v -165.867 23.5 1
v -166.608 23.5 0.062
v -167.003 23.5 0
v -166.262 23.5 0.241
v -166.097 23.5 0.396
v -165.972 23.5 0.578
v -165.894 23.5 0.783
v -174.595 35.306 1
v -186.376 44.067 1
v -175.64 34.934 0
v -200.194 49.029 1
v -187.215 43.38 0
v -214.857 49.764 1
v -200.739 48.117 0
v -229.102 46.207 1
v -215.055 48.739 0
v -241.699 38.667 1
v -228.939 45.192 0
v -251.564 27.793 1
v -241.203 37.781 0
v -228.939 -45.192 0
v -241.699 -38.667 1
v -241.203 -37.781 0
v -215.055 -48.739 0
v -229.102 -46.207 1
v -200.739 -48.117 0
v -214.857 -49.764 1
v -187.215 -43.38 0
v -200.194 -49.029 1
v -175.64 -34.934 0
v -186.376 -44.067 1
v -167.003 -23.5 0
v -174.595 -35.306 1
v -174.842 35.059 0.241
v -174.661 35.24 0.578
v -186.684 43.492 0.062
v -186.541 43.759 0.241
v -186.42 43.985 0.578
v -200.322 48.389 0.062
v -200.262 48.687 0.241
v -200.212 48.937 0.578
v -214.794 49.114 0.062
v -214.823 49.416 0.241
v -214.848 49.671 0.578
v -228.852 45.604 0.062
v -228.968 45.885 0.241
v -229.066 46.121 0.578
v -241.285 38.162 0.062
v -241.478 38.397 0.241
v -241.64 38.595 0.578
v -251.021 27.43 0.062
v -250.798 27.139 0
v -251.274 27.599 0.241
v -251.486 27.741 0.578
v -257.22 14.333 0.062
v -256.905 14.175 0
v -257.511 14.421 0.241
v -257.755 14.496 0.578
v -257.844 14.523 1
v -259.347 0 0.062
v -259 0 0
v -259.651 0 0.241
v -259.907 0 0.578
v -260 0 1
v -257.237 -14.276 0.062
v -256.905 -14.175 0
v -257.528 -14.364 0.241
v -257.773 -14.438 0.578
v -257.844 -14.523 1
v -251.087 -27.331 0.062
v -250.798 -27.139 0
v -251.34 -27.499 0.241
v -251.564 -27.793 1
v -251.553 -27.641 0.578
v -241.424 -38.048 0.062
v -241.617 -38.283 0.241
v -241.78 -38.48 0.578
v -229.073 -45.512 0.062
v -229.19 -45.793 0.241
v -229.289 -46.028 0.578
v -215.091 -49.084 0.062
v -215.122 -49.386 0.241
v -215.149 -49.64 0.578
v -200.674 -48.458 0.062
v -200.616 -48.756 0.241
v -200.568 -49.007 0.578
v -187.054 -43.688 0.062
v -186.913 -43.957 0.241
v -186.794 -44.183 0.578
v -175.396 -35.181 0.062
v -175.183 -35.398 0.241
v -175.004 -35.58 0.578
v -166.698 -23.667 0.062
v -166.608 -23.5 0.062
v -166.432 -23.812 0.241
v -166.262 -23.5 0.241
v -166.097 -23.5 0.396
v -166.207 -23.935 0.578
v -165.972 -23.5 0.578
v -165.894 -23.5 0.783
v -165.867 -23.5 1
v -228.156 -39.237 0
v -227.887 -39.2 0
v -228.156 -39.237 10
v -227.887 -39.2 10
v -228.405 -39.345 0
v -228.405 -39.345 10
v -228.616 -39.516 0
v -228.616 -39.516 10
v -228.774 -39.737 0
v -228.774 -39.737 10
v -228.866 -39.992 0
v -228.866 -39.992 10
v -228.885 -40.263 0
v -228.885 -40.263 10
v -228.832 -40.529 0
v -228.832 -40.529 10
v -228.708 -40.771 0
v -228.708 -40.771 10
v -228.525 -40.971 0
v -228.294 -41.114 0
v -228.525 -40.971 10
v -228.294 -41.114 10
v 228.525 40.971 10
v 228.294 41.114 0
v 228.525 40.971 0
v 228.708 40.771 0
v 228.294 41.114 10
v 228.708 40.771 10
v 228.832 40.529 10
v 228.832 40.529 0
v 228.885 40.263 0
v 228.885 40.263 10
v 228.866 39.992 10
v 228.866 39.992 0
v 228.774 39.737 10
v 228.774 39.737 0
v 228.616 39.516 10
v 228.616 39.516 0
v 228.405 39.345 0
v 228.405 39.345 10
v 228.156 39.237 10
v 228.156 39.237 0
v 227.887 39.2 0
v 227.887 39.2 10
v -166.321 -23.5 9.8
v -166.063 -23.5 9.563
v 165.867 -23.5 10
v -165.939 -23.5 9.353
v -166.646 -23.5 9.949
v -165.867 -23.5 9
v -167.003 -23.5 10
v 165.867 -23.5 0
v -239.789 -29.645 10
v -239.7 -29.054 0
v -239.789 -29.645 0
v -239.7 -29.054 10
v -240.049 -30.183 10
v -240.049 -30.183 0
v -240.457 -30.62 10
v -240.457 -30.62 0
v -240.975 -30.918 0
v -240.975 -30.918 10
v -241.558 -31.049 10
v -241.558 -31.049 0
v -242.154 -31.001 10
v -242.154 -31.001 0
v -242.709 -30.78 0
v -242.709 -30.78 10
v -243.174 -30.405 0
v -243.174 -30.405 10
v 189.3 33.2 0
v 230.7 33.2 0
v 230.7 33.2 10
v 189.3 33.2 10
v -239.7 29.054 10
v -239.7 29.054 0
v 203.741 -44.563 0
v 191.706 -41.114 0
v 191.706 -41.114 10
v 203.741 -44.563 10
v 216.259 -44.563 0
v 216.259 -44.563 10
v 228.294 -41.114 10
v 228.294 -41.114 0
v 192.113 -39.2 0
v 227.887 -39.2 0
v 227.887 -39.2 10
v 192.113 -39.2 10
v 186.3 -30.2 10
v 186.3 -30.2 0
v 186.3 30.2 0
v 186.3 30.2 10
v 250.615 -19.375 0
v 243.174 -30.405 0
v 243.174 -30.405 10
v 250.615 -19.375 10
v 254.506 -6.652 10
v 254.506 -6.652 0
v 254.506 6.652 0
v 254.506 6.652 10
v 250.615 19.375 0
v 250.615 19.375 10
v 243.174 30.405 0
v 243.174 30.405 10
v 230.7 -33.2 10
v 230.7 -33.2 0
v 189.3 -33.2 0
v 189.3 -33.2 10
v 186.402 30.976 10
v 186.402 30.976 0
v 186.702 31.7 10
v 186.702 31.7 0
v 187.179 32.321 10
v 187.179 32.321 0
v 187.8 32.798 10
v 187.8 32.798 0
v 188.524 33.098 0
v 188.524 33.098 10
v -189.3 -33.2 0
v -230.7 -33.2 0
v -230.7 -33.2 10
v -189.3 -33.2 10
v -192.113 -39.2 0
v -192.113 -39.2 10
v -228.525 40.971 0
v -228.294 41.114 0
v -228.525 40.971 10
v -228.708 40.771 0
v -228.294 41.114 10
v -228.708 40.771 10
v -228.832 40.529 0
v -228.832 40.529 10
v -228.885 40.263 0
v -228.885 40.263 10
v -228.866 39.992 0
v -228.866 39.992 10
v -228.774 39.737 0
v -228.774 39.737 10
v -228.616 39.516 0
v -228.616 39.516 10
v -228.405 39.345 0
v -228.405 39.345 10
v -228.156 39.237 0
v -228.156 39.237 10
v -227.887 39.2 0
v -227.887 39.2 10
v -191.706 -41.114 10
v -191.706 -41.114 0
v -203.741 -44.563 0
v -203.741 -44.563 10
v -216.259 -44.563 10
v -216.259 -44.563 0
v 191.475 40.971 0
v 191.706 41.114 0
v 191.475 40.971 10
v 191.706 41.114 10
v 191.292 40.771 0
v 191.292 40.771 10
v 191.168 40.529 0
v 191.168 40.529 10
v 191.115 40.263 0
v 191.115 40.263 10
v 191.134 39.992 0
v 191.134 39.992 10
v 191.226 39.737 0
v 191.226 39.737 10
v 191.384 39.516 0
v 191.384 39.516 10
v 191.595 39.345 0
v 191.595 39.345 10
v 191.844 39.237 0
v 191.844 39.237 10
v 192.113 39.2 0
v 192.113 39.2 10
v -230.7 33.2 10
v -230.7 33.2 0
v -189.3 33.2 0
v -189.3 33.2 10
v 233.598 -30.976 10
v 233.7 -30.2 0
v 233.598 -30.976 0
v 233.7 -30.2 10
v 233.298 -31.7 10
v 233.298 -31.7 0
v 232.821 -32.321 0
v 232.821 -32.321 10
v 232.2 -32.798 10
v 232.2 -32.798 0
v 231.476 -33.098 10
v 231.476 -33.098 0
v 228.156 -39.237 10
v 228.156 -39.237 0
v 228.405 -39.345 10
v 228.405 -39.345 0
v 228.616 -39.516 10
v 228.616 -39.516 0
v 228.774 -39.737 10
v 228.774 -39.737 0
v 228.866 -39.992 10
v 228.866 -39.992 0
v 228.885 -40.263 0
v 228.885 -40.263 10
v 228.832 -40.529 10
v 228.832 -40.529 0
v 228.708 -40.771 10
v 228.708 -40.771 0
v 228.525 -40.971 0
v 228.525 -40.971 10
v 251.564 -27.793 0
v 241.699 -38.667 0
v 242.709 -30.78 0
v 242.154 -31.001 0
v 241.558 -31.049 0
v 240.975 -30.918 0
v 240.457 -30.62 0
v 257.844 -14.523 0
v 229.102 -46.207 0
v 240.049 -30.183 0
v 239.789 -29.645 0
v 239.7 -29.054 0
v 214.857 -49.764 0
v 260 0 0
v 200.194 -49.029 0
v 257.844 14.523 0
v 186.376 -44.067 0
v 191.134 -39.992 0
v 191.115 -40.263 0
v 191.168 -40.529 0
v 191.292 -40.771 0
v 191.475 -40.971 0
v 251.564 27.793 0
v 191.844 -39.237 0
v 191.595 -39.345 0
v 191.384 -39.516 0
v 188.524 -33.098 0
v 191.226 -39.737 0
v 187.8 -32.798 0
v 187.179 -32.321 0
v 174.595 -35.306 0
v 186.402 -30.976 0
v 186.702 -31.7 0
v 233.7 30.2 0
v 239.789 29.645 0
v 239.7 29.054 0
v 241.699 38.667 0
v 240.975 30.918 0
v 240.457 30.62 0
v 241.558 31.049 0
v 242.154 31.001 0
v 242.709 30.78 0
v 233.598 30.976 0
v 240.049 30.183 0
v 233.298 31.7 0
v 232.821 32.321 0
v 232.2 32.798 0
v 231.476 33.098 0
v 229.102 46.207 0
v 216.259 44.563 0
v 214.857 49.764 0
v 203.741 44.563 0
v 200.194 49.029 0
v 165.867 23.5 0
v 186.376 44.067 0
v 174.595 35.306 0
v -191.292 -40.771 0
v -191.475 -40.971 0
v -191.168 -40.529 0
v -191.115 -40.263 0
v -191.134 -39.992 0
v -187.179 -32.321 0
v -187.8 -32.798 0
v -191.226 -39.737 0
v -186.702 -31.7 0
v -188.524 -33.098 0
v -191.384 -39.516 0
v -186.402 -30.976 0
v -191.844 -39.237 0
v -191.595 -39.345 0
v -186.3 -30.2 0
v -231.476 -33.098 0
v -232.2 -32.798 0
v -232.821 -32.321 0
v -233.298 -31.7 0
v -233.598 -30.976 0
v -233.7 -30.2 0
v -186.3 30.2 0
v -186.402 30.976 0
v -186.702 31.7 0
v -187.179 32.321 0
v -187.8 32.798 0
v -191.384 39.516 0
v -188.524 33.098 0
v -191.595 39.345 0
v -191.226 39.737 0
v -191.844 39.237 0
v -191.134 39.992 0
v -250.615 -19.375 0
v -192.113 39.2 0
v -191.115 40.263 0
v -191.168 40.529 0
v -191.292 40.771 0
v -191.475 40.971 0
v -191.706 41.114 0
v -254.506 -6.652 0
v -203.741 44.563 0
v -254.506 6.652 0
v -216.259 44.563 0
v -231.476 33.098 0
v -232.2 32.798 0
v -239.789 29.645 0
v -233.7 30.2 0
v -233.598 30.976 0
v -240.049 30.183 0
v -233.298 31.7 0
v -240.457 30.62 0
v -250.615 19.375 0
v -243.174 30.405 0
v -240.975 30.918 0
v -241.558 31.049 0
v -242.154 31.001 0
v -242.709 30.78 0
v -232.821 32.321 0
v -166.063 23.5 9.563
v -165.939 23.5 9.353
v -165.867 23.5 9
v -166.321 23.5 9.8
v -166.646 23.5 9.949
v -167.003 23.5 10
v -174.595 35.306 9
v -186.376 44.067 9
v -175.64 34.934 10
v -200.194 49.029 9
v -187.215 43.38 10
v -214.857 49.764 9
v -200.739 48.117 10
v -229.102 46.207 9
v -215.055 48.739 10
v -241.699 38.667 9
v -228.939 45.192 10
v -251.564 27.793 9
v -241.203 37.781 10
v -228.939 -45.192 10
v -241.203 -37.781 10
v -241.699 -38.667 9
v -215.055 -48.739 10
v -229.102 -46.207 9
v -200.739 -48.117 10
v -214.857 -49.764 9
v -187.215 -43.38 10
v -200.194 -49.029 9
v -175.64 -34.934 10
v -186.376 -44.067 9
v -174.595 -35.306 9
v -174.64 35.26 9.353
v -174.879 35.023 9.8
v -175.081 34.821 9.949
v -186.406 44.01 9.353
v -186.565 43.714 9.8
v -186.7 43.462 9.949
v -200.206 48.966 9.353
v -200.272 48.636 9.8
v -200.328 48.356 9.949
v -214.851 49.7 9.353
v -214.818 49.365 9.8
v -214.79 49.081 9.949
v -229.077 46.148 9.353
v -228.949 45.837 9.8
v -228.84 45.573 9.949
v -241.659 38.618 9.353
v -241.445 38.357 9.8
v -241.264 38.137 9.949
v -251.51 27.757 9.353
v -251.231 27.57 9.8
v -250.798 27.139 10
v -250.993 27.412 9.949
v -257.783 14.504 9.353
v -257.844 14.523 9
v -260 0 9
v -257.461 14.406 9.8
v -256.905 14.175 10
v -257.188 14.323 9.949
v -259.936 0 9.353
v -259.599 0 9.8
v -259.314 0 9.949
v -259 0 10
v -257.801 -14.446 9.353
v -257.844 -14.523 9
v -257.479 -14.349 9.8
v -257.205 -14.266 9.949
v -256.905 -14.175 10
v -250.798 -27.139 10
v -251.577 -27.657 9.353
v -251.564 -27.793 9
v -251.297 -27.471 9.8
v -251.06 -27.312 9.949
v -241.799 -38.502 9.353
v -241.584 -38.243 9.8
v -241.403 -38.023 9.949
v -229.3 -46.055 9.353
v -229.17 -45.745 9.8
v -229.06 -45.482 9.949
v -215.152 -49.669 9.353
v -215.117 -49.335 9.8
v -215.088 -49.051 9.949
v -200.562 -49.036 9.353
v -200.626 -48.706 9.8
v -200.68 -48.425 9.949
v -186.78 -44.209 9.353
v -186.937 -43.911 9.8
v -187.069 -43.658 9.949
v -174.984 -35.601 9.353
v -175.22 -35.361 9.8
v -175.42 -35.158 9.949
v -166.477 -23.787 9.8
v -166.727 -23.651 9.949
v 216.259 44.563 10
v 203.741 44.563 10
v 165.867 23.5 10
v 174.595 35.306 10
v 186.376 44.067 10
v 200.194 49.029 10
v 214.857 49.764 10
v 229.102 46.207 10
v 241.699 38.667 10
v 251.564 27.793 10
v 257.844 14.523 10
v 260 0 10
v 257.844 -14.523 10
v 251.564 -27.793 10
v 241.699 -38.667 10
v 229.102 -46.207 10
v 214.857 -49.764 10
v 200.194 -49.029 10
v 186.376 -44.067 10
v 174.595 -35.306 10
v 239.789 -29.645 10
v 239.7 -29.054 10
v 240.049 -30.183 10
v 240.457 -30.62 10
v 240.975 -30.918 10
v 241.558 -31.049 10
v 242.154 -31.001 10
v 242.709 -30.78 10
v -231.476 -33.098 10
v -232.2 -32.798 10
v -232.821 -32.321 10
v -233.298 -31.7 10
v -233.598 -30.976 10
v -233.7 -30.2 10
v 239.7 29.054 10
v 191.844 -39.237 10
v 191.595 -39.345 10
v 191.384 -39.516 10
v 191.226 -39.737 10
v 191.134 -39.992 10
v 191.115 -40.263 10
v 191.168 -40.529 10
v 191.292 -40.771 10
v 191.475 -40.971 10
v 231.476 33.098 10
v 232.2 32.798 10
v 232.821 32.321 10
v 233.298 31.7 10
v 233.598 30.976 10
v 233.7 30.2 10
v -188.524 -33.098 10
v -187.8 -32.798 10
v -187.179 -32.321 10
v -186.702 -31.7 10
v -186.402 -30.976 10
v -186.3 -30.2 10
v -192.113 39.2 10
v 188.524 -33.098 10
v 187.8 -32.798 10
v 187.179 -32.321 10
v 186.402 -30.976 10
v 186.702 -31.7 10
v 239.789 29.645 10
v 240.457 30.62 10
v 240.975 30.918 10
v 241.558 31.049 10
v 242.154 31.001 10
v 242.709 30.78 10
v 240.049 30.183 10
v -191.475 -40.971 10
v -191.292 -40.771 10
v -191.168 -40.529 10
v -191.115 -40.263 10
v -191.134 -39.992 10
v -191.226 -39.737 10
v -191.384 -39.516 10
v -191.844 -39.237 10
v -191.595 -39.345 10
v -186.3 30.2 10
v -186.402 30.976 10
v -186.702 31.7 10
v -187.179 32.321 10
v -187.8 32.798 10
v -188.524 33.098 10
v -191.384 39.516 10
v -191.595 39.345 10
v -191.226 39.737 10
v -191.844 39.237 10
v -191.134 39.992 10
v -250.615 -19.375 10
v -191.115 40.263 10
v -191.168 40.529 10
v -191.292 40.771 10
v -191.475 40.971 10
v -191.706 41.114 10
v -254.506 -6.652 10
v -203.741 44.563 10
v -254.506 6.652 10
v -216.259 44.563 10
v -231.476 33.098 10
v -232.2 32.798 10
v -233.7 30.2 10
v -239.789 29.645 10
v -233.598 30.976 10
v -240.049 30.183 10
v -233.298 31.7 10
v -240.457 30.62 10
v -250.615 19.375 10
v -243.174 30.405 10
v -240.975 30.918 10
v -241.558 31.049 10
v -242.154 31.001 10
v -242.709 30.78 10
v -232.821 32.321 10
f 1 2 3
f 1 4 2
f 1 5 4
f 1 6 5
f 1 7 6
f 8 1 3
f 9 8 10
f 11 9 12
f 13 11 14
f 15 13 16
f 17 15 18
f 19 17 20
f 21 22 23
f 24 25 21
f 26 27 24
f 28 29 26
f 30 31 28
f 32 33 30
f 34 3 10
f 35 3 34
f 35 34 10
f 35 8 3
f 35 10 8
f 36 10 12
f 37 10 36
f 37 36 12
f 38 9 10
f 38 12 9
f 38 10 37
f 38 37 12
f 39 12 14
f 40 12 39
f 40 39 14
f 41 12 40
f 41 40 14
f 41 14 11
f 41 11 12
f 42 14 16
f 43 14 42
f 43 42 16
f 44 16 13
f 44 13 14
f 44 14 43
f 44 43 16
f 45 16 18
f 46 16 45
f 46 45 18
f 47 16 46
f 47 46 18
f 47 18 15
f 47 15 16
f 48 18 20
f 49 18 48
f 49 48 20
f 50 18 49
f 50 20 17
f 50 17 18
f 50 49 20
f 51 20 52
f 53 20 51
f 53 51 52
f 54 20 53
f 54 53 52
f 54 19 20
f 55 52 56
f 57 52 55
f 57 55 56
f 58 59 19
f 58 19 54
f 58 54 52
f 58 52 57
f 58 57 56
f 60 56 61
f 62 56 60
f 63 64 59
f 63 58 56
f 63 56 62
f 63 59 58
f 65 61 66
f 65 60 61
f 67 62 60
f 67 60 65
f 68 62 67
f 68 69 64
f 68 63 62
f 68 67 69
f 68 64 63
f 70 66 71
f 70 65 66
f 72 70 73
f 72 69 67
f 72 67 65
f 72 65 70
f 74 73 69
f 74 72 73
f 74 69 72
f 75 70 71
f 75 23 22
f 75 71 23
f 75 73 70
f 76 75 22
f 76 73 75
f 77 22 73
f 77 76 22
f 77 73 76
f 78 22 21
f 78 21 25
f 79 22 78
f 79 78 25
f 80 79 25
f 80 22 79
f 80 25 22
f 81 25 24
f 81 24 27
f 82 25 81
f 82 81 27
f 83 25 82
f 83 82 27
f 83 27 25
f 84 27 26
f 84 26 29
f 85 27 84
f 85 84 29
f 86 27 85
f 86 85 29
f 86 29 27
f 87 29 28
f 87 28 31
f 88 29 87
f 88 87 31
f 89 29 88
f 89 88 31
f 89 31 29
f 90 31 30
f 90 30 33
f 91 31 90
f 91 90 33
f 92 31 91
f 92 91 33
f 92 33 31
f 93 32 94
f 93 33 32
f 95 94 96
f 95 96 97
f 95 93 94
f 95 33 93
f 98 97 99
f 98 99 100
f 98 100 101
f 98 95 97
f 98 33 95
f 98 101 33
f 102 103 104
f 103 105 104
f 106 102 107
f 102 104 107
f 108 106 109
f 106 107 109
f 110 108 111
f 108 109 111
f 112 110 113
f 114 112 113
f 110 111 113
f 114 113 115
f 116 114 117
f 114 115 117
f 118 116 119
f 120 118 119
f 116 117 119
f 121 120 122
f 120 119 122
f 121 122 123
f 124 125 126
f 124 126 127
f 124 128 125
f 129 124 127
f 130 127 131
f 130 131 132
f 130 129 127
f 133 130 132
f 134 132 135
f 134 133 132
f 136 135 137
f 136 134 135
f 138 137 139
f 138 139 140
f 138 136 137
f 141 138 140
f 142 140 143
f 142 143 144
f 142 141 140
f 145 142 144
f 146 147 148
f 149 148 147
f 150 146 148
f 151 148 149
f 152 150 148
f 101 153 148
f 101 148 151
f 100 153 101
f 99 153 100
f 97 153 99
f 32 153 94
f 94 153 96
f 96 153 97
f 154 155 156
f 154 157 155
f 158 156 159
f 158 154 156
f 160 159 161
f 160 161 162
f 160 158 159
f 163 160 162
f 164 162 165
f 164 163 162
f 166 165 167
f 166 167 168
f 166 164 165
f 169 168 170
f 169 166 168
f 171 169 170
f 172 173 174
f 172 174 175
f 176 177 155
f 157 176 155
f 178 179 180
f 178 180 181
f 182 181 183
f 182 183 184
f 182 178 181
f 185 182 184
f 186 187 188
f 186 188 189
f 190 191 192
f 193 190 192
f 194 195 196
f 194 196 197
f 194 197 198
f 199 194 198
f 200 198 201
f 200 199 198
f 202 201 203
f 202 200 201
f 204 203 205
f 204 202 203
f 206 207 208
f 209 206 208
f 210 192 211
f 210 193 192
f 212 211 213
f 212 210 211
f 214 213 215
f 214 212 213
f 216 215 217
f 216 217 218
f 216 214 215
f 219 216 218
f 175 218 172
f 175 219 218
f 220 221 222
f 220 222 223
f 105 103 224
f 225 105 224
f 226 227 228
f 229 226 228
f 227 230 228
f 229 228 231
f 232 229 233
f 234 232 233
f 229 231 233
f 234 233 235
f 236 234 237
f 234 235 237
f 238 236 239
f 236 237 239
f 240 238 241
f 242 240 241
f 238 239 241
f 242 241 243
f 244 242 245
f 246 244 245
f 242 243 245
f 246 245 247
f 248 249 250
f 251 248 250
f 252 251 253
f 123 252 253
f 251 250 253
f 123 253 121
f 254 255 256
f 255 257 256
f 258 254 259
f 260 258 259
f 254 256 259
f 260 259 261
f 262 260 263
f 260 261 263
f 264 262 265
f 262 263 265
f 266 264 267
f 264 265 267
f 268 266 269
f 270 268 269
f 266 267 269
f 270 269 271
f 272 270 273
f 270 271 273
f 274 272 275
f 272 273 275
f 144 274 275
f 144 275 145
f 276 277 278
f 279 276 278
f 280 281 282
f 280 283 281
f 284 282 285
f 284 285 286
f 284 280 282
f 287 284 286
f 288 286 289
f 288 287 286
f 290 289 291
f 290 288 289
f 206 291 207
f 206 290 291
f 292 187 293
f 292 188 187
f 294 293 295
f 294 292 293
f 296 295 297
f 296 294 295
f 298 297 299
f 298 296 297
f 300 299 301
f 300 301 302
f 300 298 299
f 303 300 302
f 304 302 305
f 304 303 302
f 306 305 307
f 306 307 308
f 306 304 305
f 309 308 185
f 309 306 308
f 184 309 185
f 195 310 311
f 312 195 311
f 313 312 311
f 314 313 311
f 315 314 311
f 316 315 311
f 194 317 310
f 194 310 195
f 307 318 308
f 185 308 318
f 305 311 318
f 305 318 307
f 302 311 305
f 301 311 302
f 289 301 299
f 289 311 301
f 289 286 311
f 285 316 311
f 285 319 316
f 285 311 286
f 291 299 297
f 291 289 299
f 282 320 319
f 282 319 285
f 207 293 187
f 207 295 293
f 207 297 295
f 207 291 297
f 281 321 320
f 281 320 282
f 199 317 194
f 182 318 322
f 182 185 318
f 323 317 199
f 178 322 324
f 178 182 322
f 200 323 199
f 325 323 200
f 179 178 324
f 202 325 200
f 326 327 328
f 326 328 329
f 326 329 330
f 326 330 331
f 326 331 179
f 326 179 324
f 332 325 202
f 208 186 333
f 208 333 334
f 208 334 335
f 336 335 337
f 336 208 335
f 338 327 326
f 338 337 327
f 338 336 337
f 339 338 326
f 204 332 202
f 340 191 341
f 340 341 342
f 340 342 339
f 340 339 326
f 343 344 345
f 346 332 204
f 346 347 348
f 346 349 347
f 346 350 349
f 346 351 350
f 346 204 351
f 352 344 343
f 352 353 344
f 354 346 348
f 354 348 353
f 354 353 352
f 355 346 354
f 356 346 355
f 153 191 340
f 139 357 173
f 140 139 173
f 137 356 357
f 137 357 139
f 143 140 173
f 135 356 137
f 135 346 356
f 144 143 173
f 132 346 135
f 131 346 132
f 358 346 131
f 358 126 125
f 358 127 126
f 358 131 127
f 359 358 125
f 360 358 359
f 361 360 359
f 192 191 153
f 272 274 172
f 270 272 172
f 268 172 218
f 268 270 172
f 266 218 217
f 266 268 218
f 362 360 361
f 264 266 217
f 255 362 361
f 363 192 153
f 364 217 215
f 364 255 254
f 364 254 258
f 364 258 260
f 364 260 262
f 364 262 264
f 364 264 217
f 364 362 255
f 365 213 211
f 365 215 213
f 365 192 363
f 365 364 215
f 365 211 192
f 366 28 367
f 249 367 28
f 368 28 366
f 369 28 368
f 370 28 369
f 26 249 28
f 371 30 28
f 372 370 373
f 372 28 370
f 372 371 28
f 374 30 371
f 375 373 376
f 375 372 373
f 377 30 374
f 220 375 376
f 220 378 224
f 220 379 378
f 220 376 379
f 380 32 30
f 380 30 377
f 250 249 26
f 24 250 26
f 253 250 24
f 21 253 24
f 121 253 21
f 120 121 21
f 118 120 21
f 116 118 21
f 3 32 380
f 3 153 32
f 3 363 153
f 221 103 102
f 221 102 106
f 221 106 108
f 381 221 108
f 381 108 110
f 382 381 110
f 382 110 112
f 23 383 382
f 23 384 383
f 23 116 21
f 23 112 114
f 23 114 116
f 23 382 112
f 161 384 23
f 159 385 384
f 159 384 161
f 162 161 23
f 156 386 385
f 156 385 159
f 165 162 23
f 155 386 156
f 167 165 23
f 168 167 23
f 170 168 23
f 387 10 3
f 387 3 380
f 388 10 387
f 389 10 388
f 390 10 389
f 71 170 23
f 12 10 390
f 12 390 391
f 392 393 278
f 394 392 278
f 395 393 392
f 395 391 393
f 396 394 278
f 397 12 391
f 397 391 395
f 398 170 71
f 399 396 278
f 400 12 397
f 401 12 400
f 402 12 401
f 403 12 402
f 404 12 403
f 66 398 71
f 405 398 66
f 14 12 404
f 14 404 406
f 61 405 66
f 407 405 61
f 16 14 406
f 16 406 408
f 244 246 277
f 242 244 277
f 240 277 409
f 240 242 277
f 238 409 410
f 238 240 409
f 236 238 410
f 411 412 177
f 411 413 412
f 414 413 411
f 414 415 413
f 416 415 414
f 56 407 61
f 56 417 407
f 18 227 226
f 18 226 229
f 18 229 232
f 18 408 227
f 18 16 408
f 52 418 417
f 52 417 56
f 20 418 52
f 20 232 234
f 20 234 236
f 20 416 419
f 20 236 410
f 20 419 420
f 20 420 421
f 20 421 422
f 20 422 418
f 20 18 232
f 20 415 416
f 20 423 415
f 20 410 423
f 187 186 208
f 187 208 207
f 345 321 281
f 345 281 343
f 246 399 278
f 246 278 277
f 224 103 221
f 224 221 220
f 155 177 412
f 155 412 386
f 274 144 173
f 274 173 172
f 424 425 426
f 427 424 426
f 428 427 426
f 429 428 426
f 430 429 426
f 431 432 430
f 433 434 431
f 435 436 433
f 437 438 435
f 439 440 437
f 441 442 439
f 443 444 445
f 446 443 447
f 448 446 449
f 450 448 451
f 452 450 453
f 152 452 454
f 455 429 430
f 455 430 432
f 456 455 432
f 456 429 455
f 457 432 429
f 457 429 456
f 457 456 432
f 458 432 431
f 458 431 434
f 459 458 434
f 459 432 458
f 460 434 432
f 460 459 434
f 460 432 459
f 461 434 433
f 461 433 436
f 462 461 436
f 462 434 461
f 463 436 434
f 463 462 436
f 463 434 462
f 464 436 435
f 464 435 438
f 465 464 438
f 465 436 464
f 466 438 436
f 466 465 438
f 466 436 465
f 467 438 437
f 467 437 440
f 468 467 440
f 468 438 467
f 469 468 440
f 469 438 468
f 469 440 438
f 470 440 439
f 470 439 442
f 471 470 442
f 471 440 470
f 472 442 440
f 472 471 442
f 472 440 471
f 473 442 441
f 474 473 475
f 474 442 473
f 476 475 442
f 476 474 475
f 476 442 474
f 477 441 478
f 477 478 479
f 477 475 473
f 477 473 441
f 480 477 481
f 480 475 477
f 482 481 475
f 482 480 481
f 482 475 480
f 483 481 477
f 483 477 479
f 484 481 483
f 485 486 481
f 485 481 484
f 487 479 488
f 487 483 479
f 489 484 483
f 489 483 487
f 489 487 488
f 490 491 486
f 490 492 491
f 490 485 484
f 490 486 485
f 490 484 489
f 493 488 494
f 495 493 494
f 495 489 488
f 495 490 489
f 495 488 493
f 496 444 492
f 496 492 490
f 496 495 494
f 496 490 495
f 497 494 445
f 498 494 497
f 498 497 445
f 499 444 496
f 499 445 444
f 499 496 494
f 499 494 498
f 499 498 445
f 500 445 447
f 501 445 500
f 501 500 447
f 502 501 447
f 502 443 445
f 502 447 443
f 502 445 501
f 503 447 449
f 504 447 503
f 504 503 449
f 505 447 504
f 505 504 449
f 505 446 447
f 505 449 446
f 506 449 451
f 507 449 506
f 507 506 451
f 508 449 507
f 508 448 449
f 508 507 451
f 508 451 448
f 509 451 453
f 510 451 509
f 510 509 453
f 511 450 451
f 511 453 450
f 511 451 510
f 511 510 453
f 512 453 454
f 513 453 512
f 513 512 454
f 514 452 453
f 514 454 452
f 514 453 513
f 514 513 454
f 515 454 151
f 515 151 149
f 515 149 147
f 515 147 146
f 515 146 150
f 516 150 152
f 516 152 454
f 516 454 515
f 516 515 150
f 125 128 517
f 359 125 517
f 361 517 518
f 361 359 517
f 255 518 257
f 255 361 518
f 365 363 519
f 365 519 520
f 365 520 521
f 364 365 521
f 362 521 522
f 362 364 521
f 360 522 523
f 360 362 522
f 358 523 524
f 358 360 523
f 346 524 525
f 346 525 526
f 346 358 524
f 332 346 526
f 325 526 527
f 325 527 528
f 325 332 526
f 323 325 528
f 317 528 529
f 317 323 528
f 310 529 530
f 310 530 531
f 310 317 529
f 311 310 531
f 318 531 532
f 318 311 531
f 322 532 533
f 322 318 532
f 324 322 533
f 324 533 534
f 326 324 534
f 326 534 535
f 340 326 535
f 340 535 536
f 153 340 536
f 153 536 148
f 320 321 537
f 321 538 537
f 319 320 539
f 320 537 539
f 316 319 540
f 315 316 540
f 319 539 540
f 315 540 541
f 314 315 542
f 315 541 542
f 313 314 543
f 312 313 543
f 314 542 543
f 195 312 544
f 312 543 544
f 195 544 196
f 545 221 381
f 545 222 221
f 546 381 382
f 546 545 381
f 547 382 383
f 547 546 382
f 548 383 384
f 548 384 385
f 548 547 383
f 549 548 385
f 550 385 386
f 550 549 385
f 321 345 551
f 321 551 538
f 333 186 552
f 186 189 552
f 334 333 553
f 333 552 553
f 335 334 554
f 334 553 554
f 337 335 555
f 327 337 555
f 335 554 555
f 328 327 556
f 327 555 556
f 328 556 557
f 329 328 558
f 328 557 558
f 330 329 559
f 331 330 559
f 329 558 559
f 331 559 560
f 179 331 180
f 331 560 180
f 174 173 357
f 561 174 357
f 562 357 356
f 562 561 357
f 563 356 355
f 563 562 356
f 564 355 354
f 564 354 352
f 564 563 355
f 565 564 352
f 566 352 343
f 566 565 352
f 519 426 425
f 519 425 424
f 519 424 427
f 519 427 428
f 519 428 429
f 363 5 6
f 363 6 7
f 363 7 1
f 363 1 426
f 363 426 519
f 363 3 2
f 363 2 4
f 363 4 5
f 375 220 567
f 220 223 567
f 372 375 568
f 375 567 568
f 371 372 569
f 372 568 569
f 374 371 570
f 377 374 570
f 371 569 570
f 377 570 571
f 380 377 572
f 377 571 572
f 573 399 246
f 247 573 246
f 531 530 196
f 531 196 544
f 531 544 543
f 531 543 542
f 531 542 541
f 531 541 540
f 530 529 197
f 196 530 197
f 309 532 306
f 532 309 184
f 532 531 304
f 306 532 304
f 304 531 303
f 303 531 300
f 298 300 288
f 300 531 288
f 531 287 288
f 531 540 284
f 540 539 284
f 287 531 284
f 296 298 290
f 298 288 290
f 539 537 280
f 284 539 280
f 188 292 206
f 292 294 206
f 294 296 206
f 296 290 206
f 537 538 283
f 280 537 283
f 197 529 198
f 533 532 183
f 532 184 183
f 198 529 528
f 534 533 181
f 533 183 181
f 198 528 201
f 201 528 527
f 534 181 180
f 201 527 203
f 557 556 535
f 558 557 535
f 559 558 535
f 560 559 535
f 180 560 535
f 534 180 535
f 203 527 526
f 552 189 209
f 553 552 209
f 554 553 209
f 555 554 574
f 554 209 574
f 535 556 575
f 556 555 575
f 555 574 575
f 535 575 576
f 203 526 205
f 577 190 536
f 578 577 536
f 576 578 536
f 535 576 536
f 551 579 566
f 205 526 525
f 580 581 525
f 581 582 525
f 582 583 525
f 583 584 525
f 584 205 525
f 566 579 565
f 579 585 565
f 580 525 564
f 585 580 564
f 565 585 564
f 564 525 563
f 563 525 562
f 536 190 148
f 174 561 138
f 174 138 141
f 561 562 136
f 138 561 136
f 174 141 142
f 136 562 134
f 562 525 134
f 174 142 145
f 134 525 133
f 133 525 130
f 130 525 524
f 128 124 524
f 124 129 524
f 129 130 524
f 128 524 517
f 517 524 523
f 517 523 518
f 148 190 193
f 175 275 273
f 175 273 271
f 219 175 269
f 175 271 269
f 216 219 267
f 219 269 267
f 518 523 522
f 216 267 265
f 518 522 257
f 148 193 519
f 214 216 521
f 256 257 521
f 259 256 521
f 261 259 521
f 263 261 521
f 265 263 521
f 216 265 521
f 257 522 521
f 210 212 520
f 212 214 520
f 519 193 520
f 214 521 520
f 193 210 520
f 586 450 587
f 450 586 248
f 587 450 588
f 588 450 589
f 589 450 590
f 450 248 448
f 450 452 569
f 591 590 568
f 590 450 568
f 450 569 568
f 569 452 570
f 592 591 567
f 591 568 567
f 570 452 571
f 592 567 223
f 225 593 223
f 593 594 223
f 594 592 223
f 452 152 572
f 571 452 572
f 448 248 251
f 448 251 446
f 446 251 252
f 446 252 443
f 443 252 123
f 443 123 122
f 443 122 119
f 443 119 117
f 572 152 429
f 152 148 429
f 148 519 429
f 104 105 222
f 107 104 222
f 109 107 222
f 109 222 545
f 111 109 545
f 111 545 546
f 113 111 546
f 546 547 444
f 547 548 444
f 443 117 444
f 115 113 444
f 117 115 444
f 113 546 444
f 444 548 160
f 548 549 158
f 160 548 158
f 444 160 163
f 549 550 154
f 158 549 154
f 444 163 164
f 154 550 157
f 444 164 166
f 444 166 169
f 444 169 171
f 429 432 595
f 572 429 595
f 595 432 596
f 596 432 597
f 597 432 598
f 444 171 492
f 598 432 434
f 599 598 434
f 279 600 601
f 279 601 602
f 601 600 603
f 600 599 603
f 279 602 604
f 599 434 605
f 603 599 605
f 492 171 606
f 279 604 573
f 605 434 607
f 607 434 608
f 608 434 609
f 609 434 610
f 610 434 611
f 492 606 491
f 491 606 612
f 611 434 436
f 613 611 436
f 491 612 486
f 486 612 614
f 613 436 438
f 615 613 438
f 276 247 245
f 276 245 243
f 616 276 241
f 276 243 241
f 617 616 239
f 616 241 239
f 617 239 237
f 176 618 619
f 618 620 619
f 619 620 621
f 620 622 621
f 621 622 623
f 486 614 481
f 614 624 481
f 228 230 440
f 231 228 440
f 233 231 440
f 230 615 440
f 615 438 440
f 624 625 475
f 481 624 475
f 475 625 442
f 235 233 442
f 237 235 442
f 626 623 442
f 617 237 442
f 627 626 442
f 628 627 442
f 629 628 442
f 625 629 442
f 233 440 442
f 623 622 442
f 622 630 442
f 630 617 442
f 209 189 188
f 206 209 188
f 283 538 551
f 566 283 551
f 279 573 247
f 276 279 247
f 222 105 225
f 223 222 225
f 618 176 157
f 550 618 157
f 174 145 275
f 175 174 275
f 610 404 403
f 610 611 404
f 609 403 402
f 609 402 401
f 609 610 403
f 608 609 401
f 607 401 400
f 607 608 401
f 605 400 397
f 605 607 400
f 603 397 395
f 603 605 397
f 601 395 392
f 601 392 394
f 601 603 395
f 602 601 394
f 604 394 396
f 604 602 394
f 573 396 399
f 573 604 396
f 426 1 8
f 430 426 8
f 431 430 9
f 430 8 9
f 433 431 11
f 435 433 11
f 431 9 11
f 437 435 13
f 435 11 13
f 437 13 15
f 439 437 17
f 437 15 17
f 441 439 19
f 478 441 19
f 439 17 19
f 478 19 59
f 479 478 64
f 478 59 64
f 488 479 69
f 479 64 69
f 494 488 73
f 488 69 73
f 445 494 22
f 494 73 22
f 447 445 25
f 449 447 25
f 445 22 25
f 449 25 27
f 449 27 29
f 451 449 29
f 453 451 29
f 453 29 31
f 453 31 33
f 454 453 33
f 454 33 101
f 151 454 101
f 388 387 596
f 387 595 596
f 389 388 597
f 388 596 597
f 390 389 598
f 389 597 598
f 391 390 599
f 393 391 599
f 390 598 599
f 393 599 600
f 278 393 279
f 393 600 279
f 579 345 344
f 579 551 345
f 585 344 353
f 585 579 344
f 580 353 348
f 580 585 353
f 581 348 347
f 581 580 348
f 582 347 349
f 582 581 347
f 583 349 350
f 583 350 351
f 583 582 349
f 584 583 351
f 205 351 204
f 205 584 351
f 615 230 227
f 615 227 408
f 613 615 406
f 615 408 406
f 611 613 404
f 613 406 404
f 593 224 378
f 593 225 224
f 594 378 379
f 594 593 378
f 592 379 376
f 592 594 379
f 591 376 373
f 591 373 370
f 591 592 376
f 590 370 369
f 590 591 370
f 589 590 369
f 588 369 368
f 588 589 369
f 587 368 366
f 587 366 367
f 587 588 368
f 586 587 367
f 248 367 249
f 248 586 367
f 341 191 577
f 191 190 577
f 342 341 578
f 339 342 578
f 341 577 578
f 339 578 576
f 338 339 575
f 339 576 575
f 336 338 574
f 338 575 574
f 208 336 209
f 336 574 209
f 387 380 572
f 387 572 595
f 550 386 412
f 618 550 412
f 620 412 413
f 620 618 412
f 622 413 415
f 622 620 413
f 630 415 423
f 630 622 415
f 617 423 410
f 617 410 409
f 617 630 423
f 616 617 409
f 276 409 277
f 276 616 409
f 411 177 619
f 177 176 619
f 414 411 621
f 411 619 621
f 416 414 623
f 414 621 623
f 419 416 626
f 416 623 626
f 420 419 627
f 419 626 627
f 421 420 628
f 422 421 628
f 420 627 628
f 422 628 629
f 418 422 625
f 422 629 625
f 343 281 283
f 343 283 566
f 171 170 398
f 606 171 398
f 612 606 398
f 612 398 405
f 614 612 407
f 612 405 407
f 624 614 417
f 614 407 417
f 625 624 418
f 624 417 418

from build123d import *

# Parameters (mm, degrees)
SKETCH_1_W             = 47.4
SKETCH_1_H             = 66.4
EXTRUDE_1_DEPTH        = 10
FILLET_1_R             = 3
FILLET_2_R             = 2
FILLET_4_R             = 1
FILLET_5_R             = 1
FILLET_1_OF_MIRROR_1_R = 3
FILLET_2_OF_MIRROR_1_R = 2
FILLET_4_OF_MIRROR_1_R = 1


with BuildPart() as part:
    # 草图1 → 凸台-拉伸1 (new body)
    with BuildSketch(Plane.XY):
        with BuildLine():
            ThreePointArc((-165.866679255, 23.5), (-260, 0), (-165.866679255, -23.5))
            Line((-165.866679255, -23.5), (0, -23.5))
            Line((0, -23.5), (0, 23.5))
            Line((0, 23.5), (-165.866679255, 23.5))
        make_face()
        with BuildLine():
            ThreePointArc((-187.901131251, -39.2), (-210, -45), (-232.098868749, -39.2))
            Line((-232.098868749, -39.2), (-187.901131251, -39.2))
        make_face(mode=Mode.SUBTRACT)
        with BuildLine():
            ThreePointArc((-239.7, -33.806951948), (-255, 0), (-239.7, 33.806951948))
            Line((-239.7, 33.806951948), (-239.7, -33.806951948))
        make_face(mode=Mode.SUBTRACT)
        with Locations((-210, 0)):
            Rectangle(SKETCH_1_W, SKETCH_1_H, mode=Mode.SUBTRACT)
        with BuildLine():
            Line((-187.901131251, 39.2), (-232.098868749, 39.2))
            ThreePointArc((-232.098868749, 39.2), (-210, 45), (-187.901131251, 39.2))
        make_face(mode=Mode.SUBTRACT)
    extrude_1 = extrude(amount=EXTRUDE_1_DEPTH)

    # 圆角1
    fillet_1_edges = [part.edges().sort_by_distance(p)[0] for p in [
        (-186.3, 33.2, 5),
        (-233.7, 33.2, 5),
        (-233.7, -33.2, 5),
        (-186.3, -33.2, 5),
    ]]
    fillet(fillet_1_edges, radius=FILLET_1_R)

    # 圆角2
    fillet_2_edges = [part.edges().sort_by_distance(p)[0] for p in [
        (-239.7, 33.806951948, 5),
        (-239.7, -33.806951948, 5),
    ]]
    fillet(fillet_2_edges, radius=FILLET_2_R)

    # 圆角4
    fillet_4_edges = [part.edges().sort_by_distance(p)[0] for p in [
        (-187.901131251, 39.2, 5),
        (-232.098868749, 39.2, 5),
        (-187.901131251, -39.2, 5),
        (-232.098868749, -39.2, 5),
    ]]
    fillet(fillet_4_edges, radius=FILLET_4_R)

    # 圆角5
    fillet_5_edges = [part.edges().sort_by_distance(p)[0] for p in [
        (-260, 0, 10),
        (-260, 0, 0),
    ]]
    fillet(fillet_5_edges, radius=FILLET_5_R)

    # 镜向1: 凸台-拉伸1 across plane
    add(extrude_1.mirror(Plane(origin=(0, 0, 10), x_dir=(0, 0, 1), z_dir=(1, 0, 0))))

    # 圆角1 of 镜向1
    fillet_1_of_mirror_1_edges = [part.edges().sort_by_distance(p)[0] for p in [
        (186.3, 33.2, 5),
        (233.7, 33.2, 5),
        (233.7, -33.2, 5),
        (186.3, -33.2, 5),
    ]]
    fillet(fillet_1_of_mirror_1_edges, radius=FILLET_1_OF_MIRROR_1_R)

    # 圆角2 of 镜向1
    fillet_2_of_mirror_1_edges = [part.edges().sort_by_distance(p)[0] for p in [
        (239.7, 33.806951948, 5),
        (239.7, -33.806951948, 5),
    ]]
    fillet(fillet_2_of_mirror_1_edges, radius=FILLET_2_OF_MIRROR_1_R)

    # 圆角4 of 镜向1
    fillet_4_of_mirror_1_edges = [part.edges().sort_by_distance(p)[0] for p in [
        (187.901131251, 39.2, 5),
        (232.098868749, 39.2, 5),
        (187.901131251, -39.2, 5),
        (232.098868749, -39.2, 5),
    ]]
    fillet(fillet_4_of_mirror_1_edges, radius=FILLET_4_OF_MIRROR_1_R)


solid = part.part
